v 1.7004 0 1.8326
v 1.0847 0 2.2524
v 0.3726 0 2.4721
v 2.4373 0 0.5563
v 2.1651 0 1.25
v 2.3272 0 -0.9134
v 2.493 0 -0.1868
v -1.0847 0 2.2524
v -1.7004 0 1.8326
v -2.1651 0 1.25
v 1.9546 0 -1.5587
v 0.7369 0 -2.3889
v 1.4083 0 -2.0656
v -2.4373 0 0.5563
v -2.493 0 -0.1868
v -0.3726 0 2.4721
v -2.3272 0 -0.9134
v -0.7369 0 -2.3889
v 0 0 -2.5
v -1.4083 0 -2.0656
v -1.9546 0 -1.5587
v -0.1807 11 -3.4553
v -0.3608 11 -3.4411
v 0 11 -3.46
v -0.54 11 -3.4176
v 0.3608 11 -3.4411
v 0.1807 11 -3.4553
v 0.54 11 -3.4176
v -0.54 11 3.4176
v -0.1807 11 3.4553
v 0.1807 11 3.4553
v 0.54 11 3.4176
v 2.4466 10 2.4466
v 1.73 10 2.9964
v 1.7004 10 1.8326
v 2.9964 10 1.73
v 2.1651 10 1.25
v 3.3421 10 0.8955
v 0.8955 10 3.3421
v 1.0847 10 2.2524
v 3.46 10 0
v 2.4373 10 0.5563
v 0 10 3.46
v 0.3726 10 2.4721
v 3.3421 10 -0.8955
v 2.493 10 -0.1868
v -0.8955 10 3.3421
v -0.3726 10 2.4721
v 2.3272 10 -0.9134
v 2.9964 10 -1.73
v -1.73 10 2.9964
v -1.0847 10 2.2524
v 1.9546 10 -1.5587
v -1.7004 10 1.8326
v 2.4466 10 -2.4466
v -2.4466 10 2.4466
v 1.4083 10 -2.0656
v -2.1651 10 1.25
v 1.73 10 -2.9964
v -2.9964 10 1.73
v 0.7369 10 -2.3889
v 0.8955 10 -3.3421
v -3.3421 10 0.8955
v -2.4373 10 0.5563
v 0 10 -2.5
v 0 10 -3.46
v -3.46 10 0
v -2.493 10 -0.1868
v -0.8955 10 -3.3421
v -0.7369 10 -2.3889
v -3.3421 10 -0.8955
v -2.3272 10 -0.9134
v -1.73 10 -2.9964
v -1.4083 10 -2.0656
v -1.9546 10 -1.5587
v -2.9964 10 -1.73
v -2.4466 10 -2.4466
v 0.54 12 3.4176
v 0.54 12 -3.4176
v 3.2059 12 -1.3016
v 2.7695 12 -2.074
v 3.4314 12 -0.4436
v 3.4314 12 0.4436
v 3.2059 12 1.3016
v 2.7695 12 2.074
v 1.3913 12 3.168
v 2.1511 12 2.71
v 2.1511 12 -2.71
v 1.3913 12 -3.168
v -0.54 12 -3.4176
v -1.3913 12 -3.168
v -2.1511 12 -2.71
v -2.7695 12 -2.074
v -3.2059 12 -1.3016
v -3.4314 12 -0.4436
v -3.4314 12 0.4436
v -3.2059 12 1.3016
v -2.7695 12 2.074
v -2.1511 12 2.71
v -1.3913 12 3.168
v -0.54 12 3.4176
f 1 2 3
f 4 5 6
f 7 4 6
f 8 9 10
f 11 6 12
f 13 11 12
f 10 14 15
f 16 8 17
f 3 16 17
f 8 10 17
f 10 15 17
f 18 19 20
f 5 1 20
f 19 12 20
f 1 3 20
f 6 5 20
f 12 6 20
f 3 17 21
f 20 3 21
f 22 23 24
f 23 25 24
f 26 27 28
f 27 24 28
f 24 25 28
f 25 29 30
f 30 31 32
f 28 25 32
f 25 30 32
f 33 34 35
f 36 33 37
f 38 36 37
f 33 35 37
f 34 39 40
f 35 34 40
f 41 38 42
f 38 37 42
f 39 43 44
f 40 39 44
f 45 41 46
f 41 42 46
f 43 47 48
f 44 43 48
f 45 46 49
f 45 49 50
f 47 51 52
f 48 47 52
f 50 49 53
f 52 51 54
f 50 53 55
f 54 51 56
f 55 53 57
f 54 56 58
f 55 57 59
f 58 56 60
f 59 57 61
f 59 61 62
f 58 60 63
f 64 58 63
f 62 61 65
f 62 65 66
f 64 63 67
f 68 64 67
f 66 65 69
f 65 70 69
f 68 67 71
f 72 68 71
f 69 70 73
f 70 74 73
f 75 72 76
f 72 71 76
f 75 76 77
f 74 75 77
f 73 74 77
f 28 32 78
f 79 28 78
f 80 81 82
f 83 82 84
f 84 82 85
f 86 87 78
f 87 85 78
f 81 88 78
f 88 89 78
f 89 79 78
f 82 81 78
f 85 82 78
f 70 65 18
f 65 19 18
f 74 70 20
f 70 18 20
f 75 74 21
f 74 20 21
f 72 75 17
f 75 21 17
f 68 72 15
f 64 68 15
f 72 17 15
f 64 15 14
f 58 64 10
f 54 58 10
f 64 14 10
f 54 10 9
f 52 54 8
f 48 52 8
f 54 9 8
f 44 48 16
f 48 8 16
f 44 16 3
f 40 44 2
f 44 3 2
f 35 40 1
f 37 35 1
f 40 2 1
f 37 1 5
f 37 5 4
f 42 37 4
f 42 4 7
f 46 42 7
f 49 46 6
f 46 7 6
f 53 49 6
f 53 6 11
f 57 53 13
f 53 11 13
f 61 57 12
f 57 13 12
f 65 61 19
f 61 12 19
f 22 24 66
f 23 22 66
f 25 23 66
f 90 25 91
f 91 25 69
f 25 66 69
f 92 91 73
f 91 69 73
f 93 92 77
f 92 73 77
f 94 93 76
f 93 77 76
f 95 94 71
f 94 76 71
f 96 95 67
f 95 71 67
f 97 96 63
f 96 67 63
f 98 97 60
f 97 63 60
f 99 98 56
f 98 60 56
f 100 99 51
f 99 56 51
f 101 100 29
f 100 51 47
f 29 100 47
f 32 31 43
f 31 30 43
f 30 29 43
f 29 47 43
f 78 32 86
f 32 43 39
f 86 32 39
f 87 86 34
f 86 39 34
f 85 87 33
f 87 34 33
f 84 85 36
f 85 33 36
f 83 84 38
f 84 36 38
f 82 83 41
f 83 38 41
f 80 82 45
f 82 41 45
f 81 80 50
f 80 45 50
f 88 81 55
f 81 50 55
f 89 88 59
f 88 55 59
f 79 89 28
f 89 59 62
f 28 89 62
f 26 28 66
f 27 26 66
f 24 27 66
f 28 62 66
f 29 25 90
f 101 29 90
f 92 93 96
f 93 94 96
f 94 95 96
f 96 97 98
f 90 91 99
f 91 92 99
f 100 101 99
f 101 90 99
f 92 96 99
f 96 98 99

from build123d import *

# Parameters (mm, degrees)
CUT_EXTRUDE1_REACH                  = 14.959
CUT_EXTRUDE1_END_RADIUS             = 3.46
SKETCH2_W                           = 1.08
SKETCH2_H                           = 1
CUT_EXTRUDE1_DIRECTION_2_REACH      = 14.959
CUT_EXTRUDE1_DIRECTION_2_END_RADIUS = 3.46


with BuildPart() as part:
    # Sketch1 → Revolve1 (revolve)
    with BuildSketch(Plane.XY, mode=Mode.PRIVATE) as revolve1_sk:
        Polygon((0, 12), (3.46, 12), (3.46, 10), (2.5, 10), (2.5, 0), (0, 0), align=None)
    revolve(revolve1_sk.sketch.rotate(Axis((0, 0, 0), (0, 1, 0)), 90), axis=Axis((0, 0, 0), (0, 1, 0)))

    # Cut-Extrude1: up to this cylinder (the profile starts inside it)
    cut_extrude1_end = Plane(origin=(0, 11.5, 0), z_dir=(0, -1, 0)) * Cylinder(CUT_EXTRUDE1_END_RADIUS, 37.838, mode=Mode.PRIVATE)
    # Sketch2 → Cut-Extrude1 (cut, up to the surface)
    with BuildSketch(Plane.XY, mode=Mode.PRIVATE) as cut_extrude1_sk1:
        with Locations((0, 11.5)):
            Rectangle(SKETCH2_W, SKETCH2_H)
    cut_extrude1_tool1 = extrude(cut_extrude1_sk1.sketch, amount=-CUT_EXTRUDE1_REACH, mode=Mode.PRIVATE) & cut_extrude1_end
    add(cut_extrude1_tool1.solids().sort_by_distance((0, 11.5, 0))[0], mode=Mode.SUBTRACT)

    # Cut-Extrude1 direction 2: up to this cylinder (the profile starts inside it)
    cut_extrude1_direction_2_end = Plane(origin=(0, 11.5, 0), z_dir=(0, -1, 0)) * Cylinder(CUT_EXTRUDE1_DIRECTION_2_END_RADIUS, 37.838, mode=Mode.PRIVATE)
    # Sketch2 → Cut-Extrude1 direction 2 (cut, up to the surface)
    with BuildSketch(Plane.XY, mode=Mode.PRIVATE) as cut_extrude1_direction_2_sk1:
        with Locations((0, 11.5)):
            Rectangle(SKETCH2_W, SKETCH2_H)
    cut_extrude1_direction_2_tool1 = extrude(cut_extrude1_direction_2_sk1.sketch, amount=CUT_EXTRUDE1_DIRECTION_2_REACH, mode=Mode.PRIVATE) & cut_extrude1_direction_2_end
    add(cut_extrude1_direction_2_tool1.solids().sort_by_distance((0, 11.5, 0))[0], mode=Mode.SUBTRACT)


solid = part.part
